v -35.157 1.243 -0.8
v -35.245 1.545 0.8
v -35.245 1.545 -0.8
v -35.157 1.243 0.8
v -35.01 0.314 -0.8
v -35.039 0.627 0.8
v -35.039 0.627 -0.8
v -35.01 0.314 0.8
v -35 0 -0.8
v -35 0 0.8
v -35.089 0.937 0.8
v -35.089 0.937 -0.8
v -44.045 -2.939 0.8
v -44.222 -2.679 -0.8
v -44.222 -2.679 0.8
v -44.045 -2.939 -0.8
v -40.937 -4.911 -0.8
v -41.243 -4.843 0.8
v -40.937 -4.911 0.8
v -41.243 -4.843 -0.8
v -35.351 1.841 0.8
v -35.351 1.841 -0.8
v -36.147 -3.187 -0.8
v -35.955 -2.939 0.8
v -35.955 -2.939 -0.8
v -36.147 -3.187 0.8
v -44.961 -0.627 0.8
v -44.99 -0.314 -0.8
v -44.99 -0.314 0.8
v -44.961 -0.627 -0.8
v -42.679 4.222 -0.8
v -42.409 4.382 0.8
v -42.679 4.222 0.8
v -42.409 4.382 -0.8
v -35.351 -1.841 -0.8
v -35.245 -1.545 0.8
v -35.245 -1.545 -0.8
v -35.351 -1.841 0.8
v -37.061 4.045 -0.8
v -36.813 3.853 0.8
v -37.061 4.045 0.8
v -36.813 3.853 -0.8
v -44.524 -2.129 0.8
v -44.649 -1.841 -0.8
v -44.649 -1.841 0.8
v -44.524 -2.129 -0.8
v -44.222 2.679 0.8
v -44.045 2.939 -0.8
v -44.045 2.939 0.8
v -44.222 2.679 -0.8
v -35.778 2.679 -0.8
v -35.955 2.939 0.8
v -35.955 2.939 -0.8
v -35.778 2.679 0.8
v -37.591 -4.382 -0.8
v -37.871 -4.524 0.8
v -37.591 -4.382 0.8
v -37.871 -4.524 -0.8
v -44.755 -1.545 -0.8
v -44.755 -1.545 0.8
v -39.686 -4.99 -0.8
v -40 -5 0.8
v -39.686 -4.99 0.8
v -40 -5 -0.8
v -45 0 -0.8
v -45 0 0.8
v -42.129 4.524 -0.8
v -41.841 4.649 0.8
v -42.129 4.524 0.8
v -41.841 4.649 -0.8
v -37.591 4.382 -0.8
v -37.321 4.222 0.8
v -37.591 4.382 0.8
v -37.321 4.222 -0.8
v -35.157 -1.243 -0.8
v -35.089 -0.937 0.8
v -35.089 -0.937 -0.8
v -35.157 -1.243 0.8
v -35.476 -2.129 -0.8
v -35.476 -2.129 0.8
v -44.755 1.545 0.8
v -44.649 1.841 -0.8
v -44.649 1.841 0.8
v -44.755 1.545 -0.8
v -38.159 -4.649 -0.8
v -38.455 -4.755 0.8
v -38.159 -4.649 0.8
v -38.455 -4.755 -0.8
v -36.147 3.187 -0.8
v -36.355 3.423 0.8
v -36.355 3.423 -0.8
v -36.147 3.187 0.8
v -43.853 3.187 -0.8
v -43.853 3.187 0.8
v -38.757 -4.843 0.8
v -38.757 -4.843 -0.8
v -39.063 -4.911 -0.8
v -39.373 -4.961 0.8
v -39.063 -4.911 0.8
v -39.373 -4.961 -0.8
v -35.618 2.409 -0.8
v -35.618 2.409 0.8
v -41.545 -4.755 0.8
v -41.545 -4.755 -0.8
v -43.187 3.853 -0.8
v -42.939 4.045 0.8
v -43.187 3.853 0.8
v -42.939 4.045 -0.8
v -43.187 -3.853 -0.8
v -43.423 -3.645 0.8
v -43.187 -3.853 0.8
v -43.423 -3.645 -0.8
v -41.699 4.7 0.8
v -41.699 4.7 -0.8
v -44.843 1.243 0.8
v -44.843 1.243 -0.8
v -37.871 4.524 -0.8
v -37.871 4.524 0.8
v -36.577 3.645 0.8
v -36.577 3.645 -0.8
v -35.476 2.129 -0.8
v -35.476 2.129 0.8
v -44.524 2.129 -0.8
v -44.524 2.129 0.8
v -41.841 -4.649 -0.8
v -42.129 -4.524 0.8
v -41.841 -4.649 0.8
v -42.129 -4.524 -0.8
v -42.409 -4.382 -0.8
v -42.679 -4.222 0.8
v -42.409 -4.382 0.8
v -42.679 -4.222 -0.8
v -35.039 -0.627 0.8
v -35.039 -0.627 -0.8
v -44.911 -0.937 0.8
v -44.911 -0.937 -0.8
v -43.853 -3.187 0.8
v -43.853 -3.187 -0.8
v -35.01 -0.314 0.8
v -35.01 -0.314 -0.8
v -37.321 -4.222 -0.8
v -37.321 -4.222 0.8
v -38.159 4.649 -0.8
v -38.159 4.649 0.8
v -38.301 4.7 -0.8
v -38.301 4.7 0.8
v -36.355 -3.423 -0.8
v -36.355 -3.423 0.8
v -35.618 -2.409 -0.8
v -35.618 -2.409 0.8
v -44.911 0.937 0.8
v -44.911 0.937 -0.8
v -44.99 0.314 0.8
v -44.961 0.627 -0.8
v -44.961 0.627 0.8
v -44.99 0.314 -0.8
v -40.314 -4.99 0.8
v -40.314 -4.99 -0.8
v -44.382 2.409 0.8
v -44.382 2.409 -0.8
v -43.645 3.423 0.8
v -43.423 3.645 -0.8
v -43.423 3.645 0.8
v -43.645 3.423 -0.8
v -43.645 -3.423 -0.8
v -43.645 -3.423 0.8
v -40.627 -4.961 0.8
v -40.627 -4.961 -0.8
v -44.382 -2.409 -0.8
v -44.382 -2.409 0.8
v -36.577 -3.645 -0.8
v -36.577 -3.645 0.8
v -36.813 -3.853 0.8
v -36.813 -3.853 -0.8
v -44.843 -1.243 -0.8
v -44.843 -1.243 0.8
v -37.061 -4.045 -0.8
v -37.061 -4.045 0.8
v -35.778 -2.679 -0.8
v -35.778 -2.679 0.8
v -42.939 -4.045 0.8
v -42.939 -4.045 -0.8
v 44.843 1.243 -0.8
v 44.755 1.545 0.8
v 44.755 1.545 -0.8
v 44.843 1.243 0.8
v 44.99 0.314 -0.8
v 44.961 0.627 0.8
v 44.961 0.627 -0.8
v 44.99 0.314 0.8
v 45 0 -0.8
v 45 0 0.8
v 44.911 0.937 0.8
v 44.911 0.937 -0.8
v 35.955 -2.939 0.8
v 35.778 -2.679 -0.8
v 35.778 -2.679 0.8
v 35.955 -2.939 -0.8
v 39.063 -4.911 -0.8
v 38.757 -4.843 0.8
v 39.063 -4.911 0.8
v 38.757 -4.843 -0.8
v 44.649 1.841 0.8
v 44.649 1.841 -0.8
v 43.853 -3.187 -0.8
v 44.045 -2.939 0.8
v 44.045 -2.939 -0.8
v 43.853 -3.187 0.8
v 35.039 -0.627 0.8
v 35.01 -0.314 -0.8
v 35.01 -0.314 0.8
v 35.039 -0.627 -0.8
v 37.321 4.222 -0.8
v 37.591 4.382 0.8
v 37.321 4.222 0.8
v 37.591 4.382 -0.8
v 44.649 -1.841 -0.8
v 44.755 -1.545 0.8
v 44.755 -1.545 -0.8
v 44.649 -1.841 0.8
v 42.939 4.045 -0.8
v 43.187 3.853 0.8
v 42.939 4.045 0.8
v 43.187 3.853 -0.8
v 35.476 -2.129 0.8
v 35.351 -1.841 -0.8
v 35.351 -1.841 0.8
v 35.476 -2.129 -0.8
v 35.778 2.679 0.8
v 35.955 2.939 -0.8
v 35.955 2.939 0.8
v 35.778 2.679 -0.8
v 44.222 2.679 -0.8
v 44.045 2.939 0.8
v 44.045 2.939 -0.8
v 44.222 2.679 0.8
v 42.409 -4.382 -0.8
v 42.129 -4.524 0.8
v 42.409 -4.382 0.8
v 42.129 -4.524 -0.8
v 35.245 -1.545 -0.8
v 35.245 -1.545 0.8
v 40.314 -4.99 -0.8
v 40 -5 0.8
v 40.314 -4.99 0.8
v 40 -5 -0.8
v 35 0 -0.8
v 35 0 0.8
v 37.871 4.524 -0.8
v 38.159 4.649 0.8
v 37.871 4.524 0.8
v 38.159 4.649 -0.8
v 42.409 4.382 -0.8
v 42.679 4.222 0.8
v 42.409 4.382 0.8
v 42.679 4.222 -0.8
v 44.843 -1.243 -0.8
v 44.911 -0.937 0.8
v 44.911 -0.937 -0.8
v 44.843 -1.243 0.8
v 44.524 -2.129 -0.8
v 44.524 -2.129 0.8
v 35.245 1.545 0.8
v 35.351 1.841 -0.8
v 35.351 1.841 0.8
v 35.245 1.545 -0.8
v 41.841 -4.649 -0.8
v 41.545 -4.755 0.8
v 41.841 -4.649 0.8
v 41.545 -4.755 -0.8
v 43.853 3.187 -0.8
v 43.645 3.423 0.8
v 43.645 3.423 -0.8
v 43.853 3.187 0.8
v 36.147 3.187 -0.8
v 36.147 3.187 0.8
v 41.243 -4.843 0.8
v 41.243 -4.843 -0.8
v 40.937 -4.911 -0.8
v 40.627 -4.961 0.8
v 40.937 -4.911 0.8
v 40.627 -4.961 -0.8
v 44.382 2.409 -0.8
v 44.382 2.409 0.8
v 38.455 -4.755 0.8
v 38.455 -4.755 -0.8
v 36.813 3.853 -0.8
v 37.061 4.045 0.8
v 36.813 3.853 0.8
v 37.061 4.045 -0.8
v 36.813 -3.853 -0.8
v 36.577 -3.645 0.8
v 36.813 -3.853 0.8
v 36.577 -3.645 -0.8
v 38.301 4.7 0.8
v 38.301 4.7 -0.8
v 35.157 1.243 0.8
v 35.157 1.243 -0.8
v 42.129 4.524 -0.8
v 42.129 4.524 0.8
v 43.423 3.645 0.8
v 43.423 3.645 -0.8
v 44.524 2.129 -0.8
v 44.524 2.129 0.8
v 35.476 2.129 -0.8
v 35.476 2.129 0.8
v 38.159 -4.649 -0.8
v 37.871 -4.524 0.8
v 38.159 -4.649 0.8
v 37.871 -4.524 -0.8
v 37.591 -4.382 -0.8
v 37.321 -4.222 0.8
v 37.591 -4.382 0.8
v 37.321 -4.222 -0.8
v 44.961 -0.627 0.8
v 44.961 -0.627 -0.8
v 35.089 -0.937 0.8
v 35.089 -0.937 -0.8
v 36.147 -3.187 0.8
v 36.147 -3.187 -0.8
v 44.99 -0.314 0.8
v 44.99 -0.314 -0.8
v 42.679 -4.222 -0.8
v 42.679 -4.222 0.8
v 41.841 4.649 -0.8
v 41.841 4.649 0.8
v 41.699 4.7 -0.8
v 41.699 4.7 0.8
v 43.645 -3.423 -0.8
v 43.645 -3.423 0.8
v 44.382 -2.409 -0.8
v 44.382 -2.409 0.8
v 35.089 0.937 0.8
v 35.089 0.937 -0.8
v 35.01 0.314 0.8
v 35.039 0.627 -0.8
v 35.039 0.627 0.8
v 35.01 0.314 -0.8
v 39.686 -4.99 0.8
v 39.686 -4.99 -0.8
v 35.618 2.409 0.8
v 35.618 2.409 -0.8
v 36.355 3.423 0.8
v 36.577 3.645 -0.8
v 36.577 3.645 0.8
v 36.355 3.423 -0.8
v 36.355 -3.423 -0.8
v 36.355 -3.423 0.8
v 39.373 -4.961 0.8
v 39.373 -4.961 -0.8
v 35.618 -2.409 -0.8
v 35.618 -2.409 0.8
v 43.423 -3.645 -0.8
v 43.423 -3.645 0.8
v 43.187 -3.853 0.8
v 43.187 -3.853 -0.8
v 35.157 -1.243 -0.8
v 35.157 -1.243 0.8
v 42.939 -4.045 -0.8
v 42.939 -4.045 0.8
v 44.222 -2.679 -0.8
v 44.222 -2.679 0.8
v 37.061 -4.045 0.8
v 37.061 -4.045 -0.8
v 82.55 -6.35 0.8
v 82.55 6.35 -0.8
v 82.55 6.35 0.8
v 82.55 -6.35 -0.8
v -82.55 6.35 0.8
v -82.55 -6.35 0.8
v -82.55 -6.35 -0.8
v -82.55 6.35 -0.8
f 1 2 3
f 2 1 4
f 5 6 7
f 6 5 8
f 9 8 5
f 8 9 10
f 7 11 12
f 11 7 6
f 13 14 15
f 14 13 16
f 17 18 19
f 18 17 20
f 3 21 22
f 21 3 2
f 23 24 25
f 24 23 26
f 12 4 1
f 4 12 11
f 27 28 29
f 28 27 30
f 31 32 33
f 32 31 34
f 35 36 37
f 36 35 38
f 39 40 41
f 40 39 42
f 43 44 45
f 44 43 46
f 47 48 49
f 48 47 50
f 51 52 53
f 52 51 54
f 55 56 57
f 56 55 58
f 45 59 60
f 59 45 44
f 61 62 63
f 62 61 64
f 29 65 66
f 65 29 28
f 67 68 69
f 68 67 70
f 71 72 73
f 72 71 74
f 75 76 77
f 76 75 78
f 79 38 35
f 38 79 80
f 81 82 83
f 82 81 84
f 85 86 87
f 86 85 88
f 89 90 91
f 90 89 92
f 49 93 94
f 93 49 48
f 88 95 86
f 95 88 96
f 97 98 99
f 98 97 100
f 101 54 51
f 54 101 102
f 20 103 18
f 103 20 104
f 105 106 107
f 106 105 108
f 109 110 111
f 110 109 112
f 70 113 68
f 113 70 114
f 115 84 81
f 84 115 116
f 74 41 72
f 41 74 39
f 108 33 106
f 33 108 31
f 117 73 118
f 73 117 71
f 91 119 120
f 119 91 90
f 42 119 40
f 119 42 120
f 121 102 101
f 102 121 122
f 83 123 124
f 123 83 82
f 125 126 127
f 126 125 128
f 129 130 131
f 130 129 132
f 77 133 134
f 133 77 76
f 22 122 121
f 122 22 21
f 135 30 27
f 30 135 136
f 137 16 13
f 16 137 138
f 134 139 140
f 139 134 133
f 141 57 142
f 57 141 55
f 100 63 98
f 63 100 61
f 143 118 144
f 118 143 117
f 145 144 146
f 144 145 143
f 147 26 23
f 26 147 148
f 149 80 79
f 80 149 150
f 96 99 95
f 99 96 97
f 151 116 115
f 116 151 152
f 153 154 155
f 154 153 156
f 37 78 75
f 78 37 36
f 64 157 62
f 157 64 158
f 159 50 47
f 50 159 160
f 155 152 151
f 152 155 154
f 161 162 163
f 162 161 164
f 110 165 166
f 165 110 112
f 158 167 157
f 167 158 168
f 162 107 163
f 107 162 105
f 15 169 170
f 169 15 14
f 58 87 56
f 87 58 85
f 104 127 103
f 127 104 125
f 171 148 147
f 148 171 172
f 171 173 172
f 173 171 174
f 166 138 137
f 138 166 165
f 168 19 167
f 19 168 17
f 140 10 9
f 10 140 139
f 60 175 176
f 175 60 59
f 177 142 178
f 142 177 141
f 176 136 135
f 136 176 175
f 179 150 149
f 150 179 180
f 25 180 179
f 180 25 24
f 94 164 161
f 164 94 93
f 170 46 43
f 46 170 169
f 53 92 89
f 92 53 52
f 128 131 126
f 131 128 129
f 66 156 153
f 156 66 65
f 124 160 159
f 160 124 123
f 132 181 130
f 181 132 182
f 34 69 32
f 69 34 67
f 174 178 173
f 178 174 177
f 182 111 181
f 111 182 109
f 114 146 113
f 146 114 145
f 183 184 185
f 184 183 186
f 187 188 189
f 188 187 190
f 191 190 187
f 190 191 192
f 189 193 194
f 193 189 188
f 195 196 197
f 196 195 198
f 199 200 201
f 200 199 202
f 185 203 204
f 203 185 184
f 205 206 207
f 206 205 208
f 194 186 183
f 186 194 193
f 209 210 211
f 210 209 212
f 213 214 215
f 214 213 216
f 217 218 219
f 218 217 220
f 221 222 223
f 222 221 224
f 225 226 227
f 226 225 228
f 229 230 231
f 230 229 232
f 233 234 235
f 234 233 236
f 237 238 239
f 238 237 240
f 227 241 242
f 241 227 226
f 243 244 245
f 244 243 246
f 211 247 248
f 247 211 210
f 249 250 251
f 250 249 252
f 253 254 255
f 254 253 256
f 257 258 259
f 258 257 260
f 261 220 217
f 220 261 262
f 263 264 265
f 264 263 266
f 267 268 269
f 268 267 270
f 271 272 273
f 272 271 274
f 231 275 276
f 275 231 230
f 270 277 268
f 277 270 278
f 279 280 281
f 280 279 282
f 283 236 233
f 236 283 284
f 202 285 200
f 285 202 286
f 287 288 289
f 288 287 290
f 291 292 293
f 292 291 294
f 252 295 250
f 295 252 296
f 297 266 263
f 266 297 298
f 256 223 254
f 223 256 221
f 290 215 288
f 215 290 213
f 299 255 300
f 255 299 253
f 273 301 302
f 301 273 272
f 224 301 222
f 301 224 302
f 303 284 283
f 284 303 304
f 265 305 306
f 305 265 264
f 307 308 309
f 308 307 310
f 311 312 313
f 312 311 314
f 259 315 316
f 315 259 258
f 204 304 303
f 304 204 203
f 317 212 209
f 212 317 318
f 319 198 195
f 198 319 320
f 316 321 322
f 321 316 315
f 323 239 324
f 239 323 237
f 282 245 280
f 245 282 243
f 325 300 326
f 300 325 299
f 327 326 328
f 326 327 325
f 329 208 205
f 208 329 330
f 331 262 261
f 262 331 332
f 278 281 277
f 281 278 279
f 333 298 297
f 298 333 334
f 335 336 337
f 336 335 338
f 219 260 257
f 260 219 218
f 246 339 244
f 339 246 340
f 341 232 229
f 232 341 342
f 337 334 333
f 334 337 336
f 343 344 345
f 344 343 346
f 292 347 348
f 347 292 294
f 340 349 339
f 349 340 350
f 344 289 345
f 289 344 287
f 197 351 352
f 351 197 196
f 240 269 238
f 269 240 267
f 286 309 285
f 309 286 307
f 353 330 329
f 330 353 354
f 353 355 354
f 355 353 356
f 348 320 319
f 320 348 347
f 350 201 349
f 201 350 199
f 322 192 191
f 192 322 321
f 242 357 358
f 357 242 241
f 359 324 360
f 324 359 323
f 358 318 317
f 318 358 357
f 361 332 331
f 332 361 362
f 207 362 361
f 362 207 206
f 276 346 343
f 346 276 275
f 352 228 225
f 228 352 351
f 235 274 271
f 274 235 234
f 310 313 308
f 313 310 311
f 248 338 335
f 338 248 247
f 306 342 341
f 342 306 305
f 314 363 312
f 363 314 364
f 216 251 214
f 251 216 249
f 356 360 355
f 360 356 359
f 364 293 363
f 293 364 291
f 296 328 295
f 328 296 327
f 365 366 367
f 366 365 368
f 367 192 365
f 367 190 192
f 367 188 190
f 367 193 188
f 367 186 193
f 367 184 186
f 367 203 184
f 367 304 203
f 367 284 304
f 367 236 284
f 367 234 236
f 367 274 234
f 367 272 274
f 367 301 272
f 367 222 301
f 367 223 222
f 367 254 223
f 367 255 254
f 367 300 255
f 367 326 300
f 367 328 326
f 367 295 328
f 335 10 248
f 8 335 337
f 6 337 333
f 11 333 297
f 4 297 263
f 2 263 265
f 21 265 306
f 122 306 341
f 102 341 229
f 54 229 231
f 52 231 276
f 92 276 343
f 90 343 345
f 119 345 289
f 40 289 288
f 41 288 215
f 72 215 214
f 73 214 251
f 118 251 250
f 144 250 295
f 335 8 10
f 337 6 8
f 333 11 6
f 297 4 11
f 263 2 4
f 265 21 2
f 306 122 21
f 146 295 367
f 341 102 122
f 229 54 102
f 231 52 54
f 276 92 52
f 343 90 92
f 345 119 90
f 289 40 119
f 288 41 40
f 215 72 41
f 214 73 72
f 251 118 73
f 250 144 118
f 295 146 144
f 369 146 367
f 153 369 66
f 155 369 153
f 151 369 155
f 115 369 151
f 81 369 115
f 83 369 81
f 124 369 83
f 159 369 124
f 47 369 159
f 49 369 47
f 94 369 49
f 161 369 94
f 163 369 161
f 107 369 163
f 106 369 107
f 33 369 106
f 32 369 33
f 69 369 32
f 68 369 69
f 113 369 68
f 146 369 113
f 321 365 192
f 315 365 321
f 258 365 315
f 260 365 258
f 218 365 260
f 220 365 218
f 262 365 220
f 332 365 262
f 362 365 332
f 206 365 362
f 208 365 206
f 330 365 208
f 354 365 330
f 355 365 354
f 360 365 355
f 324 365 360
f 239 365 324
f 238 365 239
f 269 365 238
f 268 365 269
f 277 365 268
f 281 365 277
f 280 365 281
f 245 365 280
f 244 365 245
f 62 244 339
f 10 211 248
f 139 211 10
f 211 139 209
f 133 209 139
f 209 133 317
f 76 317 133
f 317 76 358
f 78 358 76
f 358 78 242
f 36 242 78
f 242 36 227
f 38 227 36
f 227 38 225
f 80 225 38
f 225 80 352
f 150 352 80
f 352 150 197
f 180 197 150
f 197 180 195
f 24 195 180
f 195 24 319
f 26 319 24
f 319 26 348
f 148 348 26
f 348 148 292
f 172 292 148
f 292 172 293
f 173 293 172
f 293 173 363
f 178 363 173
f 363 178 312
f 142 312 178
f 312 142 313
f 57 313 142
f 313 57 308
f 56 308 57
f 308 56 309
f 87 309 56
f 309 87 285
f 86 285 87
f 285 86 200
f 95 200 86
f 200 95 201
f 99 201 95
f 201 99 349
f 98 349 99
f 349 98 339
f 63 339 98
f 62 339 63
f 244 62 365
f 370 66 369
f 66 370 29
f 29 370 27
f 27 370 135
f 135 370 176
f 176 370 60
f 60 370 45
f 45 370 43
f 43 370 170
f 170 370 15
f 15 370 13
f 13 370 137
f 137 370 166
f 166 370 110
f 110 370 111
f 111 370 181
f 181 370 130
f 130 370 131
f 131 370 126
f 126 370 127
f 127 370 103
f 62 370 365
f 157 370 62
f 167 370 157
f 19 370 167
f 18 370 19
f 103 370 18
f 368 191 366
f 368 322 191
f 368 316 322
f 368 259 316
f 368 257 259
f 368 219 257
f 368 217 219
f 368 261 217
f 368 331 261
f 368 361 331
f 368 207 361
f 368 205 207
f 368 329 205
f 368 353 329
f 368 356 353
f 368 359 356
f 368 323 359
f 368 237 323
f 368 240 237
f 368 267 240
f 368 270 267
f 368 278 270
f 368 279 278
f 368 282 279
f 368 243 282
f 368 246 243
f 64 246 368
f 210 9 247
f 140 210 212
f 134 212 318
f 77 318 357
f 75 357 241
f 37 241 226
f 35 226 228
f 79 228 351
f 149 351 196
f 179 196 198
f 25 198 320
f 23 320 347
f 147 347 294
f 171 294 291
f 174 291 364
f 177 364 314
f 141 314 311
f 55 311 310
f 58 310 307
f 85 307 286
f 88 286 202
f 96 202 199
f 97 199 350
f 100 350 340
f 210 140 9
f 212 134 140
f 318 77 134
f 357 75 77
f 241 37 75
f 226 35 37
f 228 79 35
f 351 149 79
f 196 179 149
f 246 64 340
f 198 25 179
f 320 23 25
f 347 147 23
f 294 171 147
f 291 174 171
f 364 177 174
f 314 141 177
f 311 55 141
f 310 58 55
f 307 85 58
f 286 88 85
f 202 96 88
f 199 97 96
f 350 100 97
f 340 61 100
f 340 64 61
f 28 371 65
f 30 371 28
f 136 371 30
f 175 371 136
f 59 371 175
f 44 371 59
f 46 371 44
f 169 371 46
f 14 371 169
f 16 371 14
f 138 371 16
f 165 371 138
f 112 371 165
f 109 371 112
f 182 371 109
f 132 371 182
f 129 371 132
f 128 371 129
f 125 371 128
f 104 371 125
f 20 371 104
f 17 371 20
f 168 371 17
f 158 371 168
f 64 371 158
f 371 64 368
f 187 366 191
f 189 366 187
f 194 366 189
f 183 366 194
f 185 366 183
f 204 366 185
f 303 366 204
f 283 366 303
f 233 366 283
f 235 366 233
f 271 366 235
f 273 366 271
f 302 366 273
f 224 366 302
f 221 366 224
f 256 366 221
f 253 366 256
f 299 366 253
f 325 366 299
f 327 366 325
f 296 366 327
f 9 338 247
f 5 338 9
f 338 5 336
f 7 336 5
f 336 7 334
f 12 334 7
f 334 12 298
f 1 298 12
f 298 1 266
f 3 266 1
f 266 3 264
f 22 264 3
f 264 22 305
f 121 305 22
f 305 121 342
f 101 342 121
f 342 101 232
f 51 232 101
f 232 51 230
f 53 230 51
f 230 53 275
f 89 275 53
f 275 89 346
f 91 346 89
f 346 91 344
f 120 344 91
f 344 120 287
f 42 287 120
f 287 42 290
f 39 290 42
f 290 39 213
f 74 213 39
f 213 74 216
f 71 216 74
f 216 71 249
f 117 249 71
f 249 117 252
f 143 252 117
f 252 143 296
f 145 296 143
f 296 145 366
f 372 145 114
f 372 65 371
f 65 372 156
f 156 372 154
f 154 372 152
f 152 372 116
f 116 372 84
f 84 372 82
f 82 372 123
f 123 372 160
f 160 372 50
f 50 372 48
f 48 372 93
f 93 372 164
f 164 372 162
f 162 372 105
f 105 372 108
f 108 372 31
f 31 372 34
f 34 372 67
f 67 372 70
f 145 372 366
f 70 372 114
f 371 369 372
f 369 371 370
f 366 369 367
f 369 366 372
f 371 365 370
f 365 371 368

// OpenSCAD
// Parametric Rectangular Panel with D-Shaped Switch Cutouts

// --- Main Panel Parameters ---
// Change these values to resize your panel. All units are in mm.

panel_width = 6.5*25.4;    // How wide the panel is
panel_height = 0.5*25.4;    // How tall the panel is
panel_thickness = 1.6; // The thickness of the material (e.g., 1.6mm for 16 gauge)


// --- Switch Cutout Parameters ---
// These are from the datasheet and should not be changed.
switch_diameter = 10;
switch_flat_distance = 9.7;


// --- Reusable Modules ---

// Module to create a single D-shaped ("flat tire") hole.
module d_hole() {
    // The hole is made by taking a cylinder and cutting off one side.
    difference() {
        // Start with a round hole.
        // It's made taller than the panel to ensure a clean cut.
        cylinder(h = panel_thickness * 2, d = switch_diameter, center = true, $fn = 100);
        
        // Cut off the top to make a flat side.
        // A cube is positioned to remove the top part of the cylinder.
        // The flat position is derived from the datasheet parameters.
        translate([0, switch_flat_distance, 0]) {
            cube([switch_diameter, switch_diameter, panel_thickness * 2], center = true);
        }
    }
}


// --- Geometry Generation ---
// This code uses the parameters and modules above to build the final part.

difference() {
    
    // 1. Create the main rectangular panel body.
    cube([panel_width, panel_height, panel_thickness], center = true);
    
    // 2. Create two D-shaped holes, 40mm apart, and subtract them.
    translate([-40, 0, 0]) {
        d_hole();
    }
    translate([40, 0, 0]) {
        d_hole();
    }
}
